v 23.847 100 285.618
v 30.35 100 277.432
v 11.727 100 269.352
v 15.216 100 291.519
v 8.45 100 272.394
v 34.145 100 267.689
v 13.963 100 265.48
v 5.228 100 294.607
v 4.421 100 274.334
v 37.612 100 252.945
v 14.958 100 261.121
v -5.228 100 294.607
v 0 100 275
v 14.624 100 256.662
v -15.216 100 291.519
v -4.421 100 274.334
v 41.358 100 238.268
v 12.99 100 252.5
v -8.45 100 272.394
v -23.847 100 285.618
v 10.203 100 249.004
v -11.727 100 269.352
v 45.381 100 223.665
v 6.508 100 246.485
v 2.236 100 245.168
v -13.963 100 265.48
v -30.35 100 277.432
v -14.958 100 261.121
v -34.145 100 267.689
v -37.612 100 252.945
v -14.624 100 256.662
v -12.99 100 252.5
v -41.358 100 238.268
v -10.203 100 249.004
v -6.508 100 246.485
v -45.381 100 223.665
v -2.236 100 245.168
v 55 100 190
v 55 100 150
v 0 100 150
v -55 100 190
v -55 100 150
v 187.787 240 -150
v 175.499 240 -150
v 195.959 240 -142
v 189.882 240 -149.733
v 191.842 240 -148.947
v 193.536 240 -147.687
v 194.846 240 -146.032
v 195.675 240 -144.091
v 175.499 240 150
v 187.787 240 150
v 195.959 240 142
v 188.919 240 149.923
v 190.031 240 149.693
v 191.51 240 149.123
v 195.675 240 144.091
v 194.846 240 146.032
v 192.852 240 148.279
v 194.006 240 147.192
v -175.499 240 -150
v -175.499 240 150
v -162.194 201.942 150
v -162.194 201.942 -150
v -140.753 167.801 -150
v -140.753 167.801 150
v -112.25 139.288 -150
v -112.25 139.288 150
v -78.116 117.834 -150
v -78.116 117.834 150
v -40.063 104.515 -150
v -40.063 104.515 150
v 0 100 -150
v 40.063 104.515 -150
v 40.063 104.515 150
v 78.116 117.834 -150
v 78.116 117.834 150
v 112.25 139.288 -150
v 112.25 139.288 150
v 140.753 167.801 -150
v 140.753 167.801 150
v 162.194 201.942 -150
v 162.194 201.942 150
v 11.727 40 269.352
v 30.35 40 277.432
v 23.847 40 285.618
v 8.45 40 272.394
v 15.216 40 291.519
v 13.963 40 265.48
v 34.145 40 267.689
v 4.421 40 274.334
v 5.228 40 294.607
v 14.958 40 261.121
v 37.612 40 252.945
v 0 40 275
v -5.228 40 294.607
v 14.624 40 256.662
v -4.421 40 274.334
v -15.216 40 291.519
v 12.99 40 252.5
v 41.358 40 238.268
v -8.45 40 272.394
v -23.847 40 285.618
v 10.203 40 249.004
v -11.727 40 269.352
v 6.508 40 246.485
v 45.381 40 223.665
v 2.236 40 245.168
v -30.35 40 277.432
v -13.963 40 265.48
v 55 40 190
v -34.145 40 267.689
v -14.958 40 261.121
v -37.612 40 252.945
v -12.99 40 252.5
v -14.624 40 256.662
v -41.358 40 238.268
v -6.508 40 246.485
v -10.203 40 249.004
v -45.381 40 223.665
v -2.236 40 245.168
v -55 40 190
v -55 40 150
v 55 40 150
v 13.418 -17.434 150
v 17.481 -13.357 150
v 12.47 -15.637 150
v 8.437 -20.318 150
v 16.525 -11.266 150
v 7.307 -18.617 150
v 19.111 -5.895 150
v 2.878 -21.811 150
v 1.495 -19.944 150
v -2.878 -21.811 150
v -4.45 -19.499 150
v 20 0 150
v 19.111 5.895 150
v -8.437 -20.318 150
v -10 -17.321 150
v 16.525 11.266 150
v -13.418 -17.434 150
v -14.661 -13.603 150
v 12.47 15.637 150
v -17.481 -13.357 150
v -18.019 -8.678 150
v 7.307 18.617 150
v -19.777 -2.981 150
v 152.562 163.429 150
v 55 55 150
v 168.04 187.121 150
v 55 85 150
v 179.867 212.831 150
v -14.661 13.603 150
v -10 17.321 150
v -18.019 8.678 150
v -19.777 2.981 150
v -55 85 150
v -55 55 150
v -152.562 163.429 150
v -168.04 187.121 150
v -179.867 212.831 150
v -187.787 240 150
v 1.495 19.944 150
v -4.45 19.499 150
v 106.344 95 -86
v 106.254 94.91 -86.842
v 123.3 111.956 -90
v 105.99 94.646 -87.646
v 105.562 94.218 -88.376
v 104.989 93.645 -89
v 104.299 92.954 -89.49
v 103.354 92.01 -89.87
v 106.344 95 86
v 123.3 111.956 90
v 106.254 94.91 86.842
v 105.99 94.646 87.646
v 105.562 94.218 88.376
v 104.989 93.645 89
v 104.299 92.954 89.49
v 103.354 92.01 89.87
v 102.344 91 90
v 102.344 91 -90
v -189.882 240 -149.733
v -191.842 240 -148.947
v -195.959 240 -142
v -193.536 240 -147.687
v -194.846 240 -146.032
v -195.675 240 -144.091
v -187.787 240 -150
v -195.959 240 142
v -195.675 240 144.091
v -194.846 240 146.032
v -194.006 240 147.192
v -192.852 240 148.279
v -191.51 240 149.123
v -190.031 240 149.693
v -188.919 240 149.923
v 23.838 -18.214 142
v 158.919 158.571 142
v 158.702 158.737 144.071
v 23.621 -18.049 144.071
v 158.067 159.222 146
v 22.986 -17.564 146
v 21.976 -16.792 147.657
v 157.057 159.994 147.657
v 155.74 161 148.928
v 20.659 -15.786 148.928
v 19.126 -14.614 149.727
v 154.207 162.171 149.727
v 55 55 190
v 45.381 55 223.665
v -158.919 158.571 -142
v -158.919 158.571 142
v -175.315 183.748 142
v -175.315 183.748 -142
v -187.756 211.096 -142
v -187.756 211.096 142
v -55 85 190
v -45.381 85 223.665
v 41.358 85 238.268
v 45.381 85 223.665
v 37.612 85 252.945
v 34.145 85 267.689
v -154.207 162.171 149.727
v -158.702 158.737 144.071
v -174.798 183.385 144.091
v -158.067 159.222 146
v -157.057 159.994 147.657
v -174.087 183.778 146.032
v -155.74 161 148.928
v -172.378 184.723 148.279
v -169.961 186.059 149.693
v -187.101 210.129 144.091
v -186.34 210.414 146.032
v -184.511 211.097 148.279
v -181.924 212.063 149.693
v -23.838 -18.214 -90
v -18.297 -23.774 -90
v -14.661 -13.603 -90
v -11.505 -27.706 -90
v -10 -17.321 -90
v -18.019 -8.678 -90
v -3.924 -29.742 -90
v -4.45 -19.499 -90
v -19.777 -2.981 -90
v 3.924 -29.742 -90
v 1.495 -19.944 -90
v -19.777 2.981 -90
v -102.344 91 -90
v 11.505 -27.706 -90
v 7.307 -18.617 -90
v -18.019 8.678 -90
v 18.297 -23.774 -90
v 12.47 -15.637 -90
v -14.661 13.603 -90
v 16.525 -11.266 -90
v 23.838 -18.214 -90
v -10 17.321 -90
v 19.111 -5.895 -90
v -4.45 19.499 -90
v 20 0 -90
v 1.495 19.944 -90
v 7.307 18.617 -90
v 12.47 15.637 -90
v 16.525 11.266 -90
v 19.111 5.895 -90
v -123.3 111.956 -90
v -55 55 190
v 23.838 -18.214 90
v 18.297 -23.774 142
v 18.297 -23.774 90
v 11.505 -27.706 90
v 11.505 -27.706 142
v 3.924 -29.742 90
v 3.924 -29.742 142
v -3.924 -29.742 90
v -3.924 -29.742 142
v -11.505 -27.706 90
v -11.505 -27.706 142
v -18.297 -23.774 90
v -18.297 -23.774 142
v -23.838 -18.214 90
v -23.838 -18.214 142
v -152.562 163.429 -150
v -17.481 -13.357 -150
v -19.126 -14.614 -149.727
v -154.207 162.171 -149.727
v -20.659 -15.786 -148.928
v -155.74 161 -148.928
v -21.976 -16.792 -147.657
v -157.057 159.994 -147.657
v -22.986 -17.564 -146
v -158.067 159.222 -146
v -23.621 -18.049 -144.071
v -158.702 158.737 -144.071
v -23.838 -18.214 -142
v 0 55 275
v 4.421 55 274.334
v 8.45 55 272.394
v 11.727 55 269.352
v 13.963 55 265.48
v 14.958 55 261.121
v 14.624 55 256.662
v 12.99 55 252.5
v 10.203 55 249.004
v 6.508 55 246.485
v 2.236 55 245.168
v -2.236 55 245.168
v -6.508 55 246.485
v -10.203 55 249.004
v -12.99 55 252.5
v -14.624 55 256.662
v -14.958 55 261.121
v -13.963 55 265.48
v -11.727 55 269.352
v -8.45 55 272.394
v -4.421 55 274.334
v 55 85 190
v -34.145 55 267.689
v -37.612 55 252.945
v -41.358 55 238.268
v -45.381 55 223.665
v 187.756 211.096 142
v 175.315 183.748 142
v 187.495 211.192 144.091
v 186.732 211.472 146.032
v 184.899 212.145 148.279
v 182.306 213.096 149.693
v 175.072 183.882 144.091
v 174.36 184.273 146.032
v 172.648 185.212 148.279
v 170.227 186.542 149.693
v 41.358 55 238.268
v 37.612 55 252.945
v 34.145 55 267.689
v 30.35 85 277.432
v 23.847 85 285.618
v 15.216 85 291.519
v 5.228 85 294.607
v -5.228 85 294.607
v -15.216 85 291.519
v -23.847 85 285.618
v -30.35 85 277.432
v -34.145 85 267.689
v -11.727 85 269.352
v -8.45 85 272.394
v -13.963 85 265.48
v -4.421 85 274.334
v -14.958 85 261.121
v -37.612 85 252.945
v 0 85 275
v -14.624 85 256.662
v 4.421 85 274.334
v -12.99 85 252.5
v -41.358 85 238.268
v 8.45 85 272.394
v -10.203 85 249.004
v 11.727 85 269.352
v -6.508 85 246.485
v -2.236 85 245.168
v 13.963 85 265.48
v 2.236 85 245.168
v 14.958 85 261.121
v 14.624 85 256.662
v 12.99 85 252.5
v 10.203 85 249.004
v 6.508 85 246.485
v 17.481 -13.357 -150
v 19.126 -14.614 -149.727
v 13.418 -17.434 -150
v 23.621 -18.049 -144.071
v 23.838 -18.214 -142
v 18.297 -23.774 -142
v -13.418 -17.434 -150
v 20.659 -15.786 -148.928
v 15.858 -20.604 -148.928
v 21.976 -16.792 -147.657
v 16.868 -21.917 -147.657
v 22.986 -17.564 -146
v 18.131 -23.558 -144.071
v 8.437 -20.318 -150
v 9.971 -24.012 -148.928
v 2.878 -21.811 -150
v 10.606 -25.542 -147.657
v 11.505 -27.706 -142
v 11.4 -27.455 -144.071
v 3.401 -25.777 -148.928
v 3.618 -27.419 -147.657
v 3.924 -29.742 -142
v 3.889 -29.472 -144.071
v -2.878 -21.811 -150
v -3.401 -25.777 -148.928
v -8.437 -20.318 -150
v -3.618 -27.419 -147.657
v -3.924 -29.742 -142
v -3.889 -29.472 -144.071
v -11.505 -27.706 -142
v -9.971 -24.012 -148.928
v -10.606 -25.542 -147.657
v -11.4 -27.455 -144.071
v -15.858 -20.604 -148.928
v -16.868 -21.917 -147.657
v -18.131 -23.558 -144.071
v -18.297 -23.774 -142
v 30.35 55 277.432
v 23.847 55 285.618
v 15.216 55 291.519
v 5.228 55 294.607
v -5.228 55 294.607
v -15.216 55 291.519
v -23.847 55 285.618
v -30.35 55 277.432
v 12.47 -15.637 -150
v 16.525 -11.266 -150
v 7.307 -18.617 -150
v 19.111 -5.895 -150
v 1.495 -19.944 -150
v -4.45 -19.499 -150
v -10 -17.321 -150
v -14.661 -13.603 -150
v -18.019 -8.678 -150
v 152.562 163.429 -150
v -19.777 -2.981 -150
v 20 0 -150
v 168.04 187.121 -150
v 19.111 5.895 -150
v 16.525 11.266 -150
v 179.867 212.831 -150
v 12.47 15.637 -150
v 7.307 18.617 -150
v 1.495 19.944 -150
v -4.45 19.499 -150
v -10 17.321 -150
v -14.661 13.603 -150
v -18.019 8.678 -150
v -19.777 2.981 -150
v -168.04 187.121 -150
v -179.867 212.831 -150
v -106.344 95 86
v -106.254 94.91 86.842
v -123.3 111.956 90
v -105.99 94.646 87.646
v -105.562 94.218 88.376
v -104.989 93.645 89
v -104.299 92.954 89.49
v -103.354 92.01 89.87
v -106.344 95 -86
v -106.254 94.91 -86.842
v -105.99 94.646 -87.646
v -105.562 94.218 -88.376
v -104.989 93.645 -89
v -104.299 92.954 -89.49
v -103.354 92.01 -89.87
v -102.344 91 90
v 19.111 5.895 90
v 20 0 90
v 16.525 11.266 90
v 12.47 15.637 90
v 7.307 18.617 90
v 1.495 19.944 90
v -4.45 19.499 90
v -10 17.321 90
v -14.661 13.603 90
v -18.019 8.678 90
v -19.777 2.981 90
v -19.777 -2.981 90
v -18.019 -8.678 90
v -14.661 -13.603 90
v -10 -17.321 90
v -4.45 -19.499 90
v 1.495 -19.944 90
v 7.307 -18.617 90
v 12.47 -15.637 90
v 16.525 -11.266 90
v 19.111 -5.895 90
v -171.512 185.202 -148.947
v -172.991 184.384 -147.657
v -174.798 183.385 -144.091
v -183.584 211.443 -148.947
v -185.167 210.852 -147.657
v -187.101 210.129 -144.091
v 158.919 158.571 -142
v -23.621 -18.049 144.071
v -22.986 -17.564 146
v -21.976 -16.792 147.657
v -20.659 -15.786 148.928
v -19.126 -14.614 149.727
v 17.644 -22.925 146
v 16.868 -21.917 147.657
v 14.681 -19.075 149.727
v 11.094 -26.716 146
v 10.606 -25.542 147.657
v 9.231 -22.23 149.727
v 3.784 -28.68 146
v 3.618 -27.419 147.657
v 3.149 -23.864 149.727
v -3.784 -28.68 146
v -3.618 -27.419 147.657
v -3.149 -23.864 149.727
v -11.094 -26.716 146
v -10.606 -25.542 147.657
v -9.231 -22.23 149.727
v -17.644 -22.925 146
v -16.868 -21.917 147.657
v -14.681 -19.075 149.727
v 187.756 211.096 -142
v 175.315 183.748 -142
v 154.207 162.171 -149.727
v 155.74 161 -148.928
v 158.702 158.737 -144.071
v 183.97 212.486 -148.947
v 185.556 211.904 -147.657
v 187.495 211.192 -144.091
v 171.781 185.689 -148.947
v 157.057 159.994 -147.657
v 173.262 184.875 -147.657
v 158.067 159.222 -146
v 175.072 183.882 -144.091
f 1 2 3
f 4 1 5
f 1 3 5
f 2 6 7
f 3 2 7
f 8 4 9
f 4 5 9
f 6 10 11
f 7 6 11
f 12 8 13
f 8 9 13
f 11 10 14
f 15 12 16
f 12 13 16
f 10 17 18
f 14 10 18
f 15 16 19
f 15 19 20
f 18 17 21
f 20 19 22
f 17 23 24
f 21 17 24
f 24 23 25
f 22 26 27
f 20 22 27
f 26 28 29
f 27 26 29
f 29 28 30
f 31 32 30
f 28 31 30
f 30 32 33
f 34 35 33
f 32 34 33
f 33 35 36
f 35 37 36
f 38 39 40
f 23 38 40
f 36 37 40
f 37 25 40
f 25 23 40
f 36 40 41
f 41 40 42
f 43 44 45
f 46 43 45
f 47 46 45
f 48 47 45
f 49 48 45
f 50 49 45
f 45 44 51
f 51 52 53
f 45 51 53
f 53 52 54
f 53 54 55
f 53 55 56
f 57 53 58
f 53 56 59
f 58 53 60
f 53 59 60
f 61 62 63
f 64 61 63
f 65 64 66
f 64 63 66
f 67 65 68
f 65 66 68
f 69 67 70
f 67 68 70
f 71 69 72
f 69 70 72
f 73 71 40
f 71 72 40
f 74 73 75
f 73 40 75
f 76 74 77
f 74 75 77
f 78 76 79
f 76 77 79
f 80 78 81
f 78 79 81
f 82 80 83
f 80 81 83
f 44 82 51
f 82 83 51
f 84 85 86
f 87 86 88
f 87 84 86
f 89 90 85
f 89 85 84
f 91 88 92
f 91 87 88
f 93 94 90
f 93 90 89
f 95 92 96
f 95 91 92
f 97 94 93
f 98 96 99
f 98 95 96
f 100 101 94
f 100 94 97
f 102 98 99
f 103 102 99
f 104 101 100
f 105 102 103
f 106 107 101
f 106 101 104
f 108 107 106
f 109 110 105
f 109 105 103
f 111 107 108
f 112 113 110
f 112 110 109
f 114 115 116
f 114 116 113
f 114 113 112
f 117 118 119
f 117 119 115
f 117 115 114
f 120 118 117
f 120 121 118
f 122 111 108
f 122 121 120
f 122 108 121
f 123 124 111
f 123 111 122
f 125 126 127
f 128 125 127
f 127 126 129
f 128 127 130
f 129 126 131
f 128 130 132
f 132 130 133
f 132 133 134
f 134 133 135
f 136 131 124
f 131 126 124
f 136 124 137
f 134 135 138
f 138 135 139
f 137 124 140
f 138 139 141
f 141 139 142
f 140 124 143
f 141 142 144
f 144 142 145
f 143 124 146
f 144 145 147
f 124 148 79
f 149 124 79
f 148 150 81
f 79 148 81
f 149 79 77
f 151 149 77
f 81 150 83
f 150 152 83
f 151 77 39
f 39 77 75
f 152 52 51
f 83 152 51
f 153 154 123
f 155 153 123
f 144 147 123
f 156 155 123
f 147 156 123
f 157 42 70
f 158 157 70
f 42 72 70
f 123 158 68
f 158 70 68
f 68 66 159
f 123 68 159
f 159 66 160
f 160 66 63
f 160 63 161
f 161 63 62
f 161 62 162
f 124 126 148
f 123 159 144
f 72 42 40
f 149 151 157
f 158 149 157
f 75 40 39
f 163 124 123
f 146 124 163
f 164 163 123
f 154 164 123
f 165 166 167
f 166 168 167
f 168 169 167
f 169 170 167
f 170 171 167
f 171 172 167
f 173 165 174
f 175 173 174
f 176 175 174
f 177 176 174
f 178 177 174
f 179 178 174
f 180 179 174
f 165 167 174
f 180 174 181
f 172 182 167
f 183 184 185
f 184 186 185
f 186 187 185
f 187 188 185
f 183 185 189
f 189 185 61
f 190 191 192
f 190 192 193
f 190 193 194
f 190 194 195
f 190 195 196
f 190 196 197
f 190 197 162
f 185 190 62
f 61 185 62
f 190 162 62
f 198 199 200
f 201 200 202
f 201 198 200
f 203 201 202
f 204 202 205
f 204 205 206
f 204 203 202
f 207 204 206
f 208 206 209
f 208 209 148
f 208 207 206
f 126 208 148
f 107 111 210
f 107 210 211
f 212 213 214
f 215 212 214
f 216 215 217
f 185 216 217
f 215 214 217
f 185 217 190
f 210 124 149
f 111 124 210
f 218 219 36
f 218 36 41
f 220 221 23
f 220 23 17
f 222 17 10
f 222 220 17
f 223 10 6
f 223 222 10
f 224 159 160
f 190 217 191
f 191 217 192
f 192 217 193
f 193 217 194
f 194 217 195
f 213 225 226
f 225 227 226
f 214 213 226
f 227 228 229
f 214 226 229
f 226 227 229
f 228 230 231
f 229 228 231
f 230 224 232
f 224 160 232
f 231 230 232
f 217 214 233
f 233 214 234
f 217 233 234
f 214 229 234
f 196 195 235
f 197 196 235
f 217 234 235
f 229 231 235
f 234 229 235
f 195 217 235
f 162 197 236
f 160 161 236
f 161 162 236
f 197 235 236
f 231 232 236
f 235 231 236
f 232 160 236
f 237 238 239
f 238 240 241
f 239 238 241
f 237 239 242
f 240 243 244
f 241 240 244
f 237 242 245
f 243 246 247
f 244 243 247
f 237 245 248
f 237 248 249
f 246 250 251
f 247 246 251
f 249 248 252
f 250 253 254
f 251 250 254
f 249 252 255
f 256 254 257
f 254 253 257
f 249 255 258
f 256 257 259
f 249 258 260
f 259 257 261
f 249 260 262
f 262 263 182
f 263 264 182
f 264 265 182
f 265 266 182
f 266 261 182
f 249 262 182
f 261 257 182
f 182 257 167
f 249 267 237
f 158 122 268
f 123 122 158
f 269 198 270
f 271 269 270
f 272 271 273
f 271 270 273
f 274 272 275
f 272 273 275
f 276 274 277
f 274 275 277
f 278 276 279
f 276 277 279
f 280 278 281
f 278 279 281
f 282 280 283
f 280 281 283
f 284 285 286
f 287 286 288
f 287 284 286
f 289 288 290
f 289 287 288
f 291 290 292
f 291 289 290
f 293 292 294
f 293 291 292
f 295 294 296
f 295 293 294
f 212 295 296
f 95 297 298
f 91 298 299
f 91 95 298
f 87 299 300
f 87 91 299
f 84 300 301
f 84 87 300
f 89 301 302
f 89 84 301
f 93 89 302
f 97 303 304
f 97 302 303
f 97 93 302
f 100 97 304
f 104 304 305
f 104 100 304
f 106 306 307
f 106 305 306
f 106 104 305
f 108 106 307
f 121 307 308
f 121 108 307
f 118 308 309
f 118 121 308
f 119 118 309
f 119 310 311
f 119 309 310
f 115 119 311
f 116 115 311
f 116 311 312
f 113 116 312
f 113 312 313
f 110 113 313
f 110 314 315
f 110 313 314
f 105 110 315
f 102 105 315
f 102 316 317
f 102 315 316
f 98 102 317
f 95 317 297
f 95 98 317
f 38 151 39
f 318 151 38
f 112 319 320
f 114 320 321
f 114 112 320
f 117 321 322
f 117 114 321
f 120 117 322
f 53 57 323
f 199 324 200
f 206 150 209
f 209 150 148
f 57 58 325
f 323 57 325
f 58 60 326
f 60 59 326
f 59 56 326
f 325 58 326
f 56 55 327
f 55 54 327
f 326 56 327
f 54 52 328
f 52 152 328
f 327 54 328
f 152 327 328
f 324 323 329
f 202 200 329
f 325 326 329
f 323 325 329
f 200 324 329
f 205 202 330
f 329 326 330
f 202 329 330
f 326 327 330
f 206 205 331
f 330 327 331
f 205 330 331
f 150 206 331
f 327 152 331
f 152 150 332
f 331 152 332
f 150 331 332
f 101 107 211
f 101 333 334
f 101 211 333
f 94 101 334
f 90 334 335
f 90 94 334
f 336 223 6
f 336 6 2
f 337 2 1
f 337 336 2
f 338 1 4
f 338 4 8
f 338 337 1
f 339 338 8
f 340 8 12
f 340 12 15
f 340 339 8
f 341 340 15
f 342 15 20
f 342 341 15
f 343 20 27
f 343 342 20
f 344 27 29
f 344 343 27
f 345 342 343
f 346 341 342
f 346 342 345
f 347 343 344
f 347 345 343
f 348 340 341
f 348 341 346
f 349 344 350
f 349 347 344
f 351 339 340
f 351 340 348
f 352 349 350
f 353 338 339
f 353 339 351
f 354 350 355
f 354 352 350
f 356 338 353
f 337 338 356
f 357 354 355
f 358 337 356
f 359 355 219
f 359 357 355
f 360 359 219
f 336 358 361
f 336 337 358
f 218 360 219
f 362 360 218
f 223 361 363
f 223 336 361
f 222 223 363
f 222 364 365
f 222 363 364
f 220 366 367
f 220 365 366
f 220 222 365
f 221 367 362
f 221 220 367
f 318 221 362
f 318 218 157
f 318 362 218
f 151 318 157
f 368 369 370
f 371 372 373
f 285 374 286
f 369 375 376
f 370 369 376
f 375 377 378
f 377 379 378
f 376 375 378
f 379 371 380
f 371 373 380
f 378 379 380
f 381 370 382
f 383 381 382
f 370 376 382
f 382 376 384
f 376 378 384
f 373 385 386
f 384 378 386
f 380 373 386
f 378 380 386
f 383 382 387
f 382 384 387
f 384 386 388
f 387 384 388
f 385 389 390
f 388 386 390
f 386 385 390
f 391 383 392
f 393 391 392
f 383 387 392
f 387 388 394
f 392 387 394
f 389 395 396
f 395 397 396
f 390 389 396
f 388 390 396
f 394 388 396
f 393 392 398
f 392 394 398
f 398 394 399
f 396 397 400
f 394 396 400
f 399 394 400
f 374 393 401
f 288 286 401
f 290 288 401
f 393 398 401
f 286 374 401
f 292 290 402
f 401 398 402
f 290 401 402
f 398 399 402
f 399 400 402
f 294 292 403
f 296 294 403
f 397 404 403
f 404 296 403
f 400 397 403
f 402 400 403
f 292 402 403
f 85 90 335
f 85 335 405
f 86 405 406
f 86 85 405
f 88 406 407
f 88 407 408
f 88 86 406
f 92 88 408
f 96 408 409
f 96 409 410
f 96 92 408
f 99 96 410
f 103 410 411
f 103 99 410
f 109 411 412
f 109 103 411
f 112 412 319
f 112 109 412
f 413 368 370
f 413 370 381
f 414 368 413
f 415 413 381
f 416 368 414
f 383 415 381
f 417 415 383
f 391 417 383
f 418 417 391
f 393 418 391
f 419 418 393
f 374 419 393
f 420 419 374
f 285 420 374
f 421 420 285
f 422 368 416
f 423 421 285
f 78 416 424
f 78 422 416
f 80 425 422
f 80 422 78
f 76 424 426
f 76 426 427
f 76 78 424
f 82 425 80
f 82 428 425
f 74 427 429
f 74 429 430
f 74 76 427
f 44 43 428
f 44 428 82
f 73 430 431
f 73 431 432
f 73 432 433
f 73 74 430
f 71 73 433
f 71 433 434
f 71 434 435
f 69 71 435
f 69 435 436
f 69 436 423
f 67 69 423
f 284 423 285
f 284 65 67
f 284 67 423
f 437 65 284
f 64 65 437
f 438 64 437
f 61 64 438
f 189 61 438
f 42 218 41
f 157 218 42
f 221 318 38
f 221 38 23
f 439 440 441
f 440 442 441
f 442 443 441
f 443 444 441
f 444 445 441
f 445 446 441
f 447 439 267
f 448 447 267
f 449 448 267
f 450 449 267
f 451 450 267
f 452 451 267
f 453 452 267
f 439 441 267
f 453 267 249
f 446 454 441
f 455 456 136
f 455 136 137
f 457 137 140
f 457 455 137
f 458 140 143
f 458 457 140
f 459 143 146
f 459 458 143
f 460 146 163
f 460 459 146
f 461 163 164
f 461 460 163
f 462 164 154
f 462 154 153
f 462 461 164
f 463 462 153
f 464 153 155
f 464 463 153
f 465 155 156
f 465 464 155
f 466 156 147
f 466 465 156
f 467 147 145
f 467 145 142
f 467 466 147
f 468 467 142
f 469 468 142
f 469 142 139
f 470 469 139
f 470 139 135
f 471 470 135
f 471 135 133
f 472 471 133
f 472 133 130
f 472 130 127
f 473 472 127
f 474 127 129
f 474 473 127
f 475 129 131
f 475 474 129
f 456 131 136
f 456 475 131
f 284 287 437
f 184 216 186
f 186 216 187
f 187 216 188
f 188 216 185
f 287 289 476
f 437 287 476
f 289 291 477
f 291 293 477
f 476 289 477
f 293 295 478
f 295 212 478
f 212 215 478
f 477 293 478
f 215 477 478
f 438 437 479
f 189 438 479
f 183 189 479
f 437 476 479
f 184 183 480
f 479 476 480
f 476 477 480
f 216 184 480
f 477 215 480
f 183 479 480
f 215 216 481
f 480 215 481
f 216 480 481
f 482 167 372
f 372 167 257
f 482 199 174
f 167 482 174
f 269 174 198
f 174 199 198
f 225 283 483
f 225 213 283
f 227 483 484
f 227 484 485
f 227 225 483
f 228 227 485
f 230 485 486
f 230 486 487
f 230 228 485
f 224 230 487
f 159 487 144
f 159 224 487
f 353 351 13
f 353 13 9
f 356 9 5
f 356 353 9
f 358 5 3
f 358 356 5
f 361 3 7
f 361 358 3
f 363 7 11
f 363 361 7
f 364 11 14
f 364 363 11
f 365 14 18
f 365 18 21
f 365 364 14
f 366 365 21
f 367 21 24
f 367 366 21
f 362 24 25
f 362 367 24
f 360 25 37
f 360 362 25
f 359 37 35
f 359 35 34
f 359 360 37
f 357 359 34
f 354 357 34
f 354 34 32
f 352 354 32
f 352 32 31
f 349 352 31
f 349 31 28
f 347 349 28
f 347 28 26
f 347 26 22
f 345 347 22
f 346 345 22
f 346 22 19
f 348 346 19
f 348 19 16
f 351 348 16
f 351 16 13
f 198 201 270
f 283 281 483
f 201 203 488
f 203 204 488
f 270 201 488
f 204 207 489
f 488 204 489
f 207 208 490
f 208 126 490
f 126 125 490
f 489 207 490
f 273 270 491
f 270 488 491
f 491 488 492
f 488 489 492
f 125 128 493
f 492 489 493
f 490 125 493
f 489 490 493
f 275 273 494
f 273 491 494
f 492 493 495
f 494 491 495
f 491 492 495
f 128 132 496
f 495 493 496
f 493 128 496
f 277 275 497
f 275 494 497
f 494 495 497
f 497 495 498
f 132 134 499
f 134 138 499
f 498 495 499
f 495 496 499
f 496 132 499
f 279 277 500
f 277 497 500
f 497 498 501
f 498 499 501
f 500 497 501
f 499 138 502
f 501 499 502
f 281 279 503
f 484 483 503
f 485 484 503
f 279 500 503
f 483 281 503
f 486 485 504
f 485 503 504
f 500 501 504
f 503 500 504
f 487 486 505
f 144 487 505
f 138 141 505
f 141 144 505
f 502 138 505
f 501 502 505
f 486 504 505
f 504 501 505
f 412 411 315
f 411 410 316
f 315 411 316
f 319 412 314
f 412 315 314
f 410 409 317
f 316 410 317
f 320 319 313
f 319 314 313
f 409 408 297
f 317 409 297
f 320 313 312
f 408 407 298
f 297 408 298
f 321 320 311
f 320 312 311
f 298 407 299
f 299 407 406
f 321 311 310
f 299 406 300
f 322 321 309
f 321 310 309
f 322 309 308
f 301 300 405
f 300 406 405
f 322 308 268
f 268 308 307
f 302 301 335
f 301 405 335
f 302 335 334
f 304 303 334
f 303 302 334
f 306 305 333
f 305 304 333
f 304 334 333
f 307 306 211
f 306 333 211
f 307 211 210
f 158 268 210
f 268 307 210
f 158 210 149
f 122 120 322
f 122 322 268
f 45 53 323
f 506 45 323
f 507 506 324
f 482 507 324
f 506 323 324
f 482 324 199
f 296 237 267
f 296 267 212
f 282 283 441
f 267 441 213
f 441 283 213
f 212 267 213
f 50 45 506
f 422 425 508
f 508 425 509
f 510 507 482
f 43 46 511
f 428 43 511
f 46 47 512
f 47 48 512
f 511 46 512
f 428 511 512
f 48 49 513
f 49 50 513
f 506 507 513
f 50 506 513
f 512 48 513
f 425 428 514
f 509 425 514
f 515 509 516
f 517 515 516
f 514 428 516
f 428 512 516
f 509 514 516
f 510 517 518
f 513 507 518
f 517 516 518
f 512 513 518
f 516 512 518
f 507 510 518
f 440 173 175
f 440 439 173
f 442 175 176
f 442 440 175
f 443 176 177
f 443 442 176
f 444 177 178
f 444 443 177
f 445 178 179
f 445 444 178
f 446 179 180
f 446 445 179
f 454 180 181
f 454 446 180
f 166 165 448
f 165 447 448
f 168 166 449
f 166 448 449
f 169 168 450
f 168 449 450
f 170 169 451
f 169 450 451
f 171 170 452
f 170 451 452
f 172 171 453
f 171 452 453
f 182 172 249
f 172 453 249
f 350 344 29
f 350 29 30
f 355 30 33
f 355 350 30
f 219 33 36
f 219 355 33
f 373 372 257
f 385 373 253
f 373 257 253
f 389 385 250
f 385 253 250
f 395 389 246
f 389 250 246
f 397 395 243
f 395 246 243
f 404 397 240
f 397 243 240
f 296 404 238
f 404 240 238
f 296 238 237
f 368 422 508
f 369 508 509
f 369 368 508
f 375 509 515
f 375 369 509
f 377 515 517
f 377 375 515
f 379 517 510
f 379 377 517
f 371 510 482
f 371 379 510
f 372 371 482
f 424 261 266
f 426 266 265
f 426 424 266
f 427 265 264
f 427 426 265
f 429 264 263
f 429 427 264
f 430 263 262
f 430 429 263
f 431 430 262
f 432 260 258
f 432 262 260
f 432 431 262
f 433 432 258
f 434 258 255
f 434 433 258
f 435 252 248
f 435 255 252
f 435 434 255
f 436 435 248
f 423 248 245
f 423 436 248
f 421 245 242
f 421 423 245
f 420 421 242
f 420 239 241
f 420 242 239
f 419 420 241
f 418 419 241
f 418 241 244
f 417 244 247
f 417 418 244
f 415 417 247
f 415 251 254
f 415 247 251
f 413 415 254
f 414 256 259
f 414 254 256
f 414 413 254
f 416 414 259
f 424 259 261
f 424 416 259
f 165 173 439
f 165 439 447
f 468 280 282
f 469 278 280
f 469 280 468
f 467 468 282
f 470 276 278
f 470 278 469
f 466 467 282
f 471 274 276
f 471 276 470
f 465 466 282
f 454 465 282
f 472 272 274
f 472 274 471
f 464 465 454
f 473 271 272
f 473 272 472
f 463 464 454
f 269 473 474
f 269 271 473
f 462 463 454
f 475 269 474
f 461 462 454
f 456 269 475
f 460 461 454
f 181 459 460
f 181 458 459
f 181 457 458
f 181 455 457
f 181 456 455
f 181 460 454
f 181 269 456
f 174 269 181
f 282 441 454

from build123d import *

# Parameters (mm, degrees)
SKETCH1_R             = 20
BOSS_EXTRUDE1_DEPTH   = 150
BOSS_EXTRUDE2_START   = 40
SKETCH2_R             = 15
BOSS_EXTRUDE2_DEPTH   = 60
SKETCH3_W             = 178.732333714
SKETCH3_H             = 30
CUT_EXTRUDE1_DEPTH    = 150
SKETCH4_W             = 180
SKETCH4_H             = 180.454063709
CUT_EXTRUDE2_DEPTH    = 170
CHAMFER1_SIZE         = 4
CHAMFER1_SIZE2        = 21.339042193
CHAMFER1_EDGE_2_SIZE  = 4
CHAMFER1_EDGE_2_SIZE2 = 21.339042193
FILLET1_R             = 4
FILLET2_R             = 8


with BuildPart() as part:
    # Sketch1 → Boss-Extrude1 (new, symmetric)
    with BuildSketch(Plane.XY):
        with BuildLine():
            Line((175.499287748, 240), (195.959179423, 240))
            ThreePointArc((195.959179423, 240), (182.049998135, 197.188176092), (158.918539009, 158.571428571))
            Line((158.918539009, 158.571428571), (23.837780851, -18.214285714))
            ThreePointArc((23.837780851, -18.214285714), (0, -30), (-23.837780851, -18.214285714))
            Line((-23.837780851, -18.214285714), (-158.918539009, 158.571428571))
            ThreePointArc((-158.918539009, 158.571428571), (-182.049998135, 197.188176092), (-195.959179423, 240))
            Line((-195.959179423, 240), (-175.499287748, 240))
            ThreePointArc((-175.499287748, 240), (0, 100), (175.499287748, 240))
        make_face()
        Circle(SKETCH1_R, mode=Mode.SUBTRACT)
    extrude(amount=BOSS_EXTRUDE1_DEPTH, both=True)

    # Sketch2 → Boss-Extrude2 (add)
    with BuildSketch(Plane(origin=(0, 0, 0), x_dir=(1, 0, 0), z_dir=(0, 1, 0)).offset(BOSS_EXTRUDE2_START)):
        with BuildLine():
            Line((0, -150), (55, -150))
            Line((55, -150), (55, -190))
            Line((55, -190), (45.381291361, -223.665480236))
            ThreePointArc((45.381291361, -223.665480236), (39.450512778, -245.597555378), (34.14492902, -267.689201664))
            ThreePointArc((34.14492902, -267.689201664), (0, -295), (-34.14492902, -267.689201664))
            ThreePointArc((-34.14492902, -267.689201664), (-39.450512778, -245.597555378), (-45.381291361, -223.665480236))
            Line((-45.381291361, -223.665480236), (-55, -190))
            Line((-55, -190), (-55, -150))
            Line((-55, -150), (0, -150))
        make_face()
        with Locations(Location((0, -260, 0), (0, 0, 270))):
            Circle(SKETCH2_R, mode=Mode.SUBTRACT)
    extrude(amount=BOSS_EXTRUDE2_DEPTH)

    # Sketch3 → Cut-Extrude1 (cut)
    with BuildSketch(Plane(origin=(55, 0, 0), x_dir=(0, 0, -1), z_dir=(1, 0, 0))):
        with Locations((-239.366166857, 70)):
            Rectangle(SKETCH3_W, SKETCH3_H)
    extrude(amount=-CUT_EXTRUDE1_DEPTH, mode=Mode.SUBTRACT)

    # Sketch4 → Cut-Extrude2 (cut, symmetric)
    with BuildSketch(Plane(origin=(0, 0, 0), x_dir=(0, 0, -1), z_dir=(1, 0, 0))):
        with Locations((0, 4.772968145)):
            Rectangle(SKETCH4_W, SKETCH4_H)
    extrude(amount=CUT_EXTRUDE2_DEPTH, both=True, mode=Mode.SUBTRACT)

    # Chamfer1
    chamfer1_edges = [part.edges().sort_by_distance(p)[0] for p in [
        (-110.344044156, 95, 0),
    ]]
    chamfer1_side = [part.faces().sort_by_distance(p)[0] for p in [
        (0, 95, 0),
    ]]
    chamfer(chamfer1_edges, length=CHAMFER1_SIZE, length2=CHAMFER1_SIZE2, reference=chamfer1_side[0])

    # Chamfer1 edge 2
    chamfer1_edge_2_edges = [part.edges().sort_by_distance(p)[0] for p in [
        (110.344044156, 95, 0),
    ]]
    chamfer1_edge_2_side = [part.faces().sort_by_distance(p)[0] for p in [
        (0, 95, 0),
    ]]
    chamfer(chamfer1_edge_2_edges, length=CHAMFER1_EDGE_2_SIZE, length2=CHAMFER1_EDGE_2_SIZE2, reference=chamfer1_edge_2_side[0])

    # Fillet1
    fillet1_edges = [part.edges().sort_by_distance(p)[0] for p in [
        (0, 95, 90),
        (0, 95, -90),
    ]]
    fillet(fillet1_edges, radius=FILLET1_R)

    # Fillet2
    fillet2_edges = [part.edges().sort_by_distance(p)[0] for p in [
        (182.049998135, 197.188176092, -150),
        (91.37815993, 70.178571429, -150),
        (0, -30, -150),
        (182.049998135, 197.188176092, 150),
        (-182.049998135, 197.188176092, 150),
        (-91.37815993, 70.178571429, 150),
        (0, -30, 150),
        (-91.37815993, 70.178571429, -150),
        (91.37815993, 70.178571429, 150),
        (-182.049998135, 197.188176092, -150),
    ]]
    fillet(fillet2_edges, radius=FILLET2_R)


solid = part.part
